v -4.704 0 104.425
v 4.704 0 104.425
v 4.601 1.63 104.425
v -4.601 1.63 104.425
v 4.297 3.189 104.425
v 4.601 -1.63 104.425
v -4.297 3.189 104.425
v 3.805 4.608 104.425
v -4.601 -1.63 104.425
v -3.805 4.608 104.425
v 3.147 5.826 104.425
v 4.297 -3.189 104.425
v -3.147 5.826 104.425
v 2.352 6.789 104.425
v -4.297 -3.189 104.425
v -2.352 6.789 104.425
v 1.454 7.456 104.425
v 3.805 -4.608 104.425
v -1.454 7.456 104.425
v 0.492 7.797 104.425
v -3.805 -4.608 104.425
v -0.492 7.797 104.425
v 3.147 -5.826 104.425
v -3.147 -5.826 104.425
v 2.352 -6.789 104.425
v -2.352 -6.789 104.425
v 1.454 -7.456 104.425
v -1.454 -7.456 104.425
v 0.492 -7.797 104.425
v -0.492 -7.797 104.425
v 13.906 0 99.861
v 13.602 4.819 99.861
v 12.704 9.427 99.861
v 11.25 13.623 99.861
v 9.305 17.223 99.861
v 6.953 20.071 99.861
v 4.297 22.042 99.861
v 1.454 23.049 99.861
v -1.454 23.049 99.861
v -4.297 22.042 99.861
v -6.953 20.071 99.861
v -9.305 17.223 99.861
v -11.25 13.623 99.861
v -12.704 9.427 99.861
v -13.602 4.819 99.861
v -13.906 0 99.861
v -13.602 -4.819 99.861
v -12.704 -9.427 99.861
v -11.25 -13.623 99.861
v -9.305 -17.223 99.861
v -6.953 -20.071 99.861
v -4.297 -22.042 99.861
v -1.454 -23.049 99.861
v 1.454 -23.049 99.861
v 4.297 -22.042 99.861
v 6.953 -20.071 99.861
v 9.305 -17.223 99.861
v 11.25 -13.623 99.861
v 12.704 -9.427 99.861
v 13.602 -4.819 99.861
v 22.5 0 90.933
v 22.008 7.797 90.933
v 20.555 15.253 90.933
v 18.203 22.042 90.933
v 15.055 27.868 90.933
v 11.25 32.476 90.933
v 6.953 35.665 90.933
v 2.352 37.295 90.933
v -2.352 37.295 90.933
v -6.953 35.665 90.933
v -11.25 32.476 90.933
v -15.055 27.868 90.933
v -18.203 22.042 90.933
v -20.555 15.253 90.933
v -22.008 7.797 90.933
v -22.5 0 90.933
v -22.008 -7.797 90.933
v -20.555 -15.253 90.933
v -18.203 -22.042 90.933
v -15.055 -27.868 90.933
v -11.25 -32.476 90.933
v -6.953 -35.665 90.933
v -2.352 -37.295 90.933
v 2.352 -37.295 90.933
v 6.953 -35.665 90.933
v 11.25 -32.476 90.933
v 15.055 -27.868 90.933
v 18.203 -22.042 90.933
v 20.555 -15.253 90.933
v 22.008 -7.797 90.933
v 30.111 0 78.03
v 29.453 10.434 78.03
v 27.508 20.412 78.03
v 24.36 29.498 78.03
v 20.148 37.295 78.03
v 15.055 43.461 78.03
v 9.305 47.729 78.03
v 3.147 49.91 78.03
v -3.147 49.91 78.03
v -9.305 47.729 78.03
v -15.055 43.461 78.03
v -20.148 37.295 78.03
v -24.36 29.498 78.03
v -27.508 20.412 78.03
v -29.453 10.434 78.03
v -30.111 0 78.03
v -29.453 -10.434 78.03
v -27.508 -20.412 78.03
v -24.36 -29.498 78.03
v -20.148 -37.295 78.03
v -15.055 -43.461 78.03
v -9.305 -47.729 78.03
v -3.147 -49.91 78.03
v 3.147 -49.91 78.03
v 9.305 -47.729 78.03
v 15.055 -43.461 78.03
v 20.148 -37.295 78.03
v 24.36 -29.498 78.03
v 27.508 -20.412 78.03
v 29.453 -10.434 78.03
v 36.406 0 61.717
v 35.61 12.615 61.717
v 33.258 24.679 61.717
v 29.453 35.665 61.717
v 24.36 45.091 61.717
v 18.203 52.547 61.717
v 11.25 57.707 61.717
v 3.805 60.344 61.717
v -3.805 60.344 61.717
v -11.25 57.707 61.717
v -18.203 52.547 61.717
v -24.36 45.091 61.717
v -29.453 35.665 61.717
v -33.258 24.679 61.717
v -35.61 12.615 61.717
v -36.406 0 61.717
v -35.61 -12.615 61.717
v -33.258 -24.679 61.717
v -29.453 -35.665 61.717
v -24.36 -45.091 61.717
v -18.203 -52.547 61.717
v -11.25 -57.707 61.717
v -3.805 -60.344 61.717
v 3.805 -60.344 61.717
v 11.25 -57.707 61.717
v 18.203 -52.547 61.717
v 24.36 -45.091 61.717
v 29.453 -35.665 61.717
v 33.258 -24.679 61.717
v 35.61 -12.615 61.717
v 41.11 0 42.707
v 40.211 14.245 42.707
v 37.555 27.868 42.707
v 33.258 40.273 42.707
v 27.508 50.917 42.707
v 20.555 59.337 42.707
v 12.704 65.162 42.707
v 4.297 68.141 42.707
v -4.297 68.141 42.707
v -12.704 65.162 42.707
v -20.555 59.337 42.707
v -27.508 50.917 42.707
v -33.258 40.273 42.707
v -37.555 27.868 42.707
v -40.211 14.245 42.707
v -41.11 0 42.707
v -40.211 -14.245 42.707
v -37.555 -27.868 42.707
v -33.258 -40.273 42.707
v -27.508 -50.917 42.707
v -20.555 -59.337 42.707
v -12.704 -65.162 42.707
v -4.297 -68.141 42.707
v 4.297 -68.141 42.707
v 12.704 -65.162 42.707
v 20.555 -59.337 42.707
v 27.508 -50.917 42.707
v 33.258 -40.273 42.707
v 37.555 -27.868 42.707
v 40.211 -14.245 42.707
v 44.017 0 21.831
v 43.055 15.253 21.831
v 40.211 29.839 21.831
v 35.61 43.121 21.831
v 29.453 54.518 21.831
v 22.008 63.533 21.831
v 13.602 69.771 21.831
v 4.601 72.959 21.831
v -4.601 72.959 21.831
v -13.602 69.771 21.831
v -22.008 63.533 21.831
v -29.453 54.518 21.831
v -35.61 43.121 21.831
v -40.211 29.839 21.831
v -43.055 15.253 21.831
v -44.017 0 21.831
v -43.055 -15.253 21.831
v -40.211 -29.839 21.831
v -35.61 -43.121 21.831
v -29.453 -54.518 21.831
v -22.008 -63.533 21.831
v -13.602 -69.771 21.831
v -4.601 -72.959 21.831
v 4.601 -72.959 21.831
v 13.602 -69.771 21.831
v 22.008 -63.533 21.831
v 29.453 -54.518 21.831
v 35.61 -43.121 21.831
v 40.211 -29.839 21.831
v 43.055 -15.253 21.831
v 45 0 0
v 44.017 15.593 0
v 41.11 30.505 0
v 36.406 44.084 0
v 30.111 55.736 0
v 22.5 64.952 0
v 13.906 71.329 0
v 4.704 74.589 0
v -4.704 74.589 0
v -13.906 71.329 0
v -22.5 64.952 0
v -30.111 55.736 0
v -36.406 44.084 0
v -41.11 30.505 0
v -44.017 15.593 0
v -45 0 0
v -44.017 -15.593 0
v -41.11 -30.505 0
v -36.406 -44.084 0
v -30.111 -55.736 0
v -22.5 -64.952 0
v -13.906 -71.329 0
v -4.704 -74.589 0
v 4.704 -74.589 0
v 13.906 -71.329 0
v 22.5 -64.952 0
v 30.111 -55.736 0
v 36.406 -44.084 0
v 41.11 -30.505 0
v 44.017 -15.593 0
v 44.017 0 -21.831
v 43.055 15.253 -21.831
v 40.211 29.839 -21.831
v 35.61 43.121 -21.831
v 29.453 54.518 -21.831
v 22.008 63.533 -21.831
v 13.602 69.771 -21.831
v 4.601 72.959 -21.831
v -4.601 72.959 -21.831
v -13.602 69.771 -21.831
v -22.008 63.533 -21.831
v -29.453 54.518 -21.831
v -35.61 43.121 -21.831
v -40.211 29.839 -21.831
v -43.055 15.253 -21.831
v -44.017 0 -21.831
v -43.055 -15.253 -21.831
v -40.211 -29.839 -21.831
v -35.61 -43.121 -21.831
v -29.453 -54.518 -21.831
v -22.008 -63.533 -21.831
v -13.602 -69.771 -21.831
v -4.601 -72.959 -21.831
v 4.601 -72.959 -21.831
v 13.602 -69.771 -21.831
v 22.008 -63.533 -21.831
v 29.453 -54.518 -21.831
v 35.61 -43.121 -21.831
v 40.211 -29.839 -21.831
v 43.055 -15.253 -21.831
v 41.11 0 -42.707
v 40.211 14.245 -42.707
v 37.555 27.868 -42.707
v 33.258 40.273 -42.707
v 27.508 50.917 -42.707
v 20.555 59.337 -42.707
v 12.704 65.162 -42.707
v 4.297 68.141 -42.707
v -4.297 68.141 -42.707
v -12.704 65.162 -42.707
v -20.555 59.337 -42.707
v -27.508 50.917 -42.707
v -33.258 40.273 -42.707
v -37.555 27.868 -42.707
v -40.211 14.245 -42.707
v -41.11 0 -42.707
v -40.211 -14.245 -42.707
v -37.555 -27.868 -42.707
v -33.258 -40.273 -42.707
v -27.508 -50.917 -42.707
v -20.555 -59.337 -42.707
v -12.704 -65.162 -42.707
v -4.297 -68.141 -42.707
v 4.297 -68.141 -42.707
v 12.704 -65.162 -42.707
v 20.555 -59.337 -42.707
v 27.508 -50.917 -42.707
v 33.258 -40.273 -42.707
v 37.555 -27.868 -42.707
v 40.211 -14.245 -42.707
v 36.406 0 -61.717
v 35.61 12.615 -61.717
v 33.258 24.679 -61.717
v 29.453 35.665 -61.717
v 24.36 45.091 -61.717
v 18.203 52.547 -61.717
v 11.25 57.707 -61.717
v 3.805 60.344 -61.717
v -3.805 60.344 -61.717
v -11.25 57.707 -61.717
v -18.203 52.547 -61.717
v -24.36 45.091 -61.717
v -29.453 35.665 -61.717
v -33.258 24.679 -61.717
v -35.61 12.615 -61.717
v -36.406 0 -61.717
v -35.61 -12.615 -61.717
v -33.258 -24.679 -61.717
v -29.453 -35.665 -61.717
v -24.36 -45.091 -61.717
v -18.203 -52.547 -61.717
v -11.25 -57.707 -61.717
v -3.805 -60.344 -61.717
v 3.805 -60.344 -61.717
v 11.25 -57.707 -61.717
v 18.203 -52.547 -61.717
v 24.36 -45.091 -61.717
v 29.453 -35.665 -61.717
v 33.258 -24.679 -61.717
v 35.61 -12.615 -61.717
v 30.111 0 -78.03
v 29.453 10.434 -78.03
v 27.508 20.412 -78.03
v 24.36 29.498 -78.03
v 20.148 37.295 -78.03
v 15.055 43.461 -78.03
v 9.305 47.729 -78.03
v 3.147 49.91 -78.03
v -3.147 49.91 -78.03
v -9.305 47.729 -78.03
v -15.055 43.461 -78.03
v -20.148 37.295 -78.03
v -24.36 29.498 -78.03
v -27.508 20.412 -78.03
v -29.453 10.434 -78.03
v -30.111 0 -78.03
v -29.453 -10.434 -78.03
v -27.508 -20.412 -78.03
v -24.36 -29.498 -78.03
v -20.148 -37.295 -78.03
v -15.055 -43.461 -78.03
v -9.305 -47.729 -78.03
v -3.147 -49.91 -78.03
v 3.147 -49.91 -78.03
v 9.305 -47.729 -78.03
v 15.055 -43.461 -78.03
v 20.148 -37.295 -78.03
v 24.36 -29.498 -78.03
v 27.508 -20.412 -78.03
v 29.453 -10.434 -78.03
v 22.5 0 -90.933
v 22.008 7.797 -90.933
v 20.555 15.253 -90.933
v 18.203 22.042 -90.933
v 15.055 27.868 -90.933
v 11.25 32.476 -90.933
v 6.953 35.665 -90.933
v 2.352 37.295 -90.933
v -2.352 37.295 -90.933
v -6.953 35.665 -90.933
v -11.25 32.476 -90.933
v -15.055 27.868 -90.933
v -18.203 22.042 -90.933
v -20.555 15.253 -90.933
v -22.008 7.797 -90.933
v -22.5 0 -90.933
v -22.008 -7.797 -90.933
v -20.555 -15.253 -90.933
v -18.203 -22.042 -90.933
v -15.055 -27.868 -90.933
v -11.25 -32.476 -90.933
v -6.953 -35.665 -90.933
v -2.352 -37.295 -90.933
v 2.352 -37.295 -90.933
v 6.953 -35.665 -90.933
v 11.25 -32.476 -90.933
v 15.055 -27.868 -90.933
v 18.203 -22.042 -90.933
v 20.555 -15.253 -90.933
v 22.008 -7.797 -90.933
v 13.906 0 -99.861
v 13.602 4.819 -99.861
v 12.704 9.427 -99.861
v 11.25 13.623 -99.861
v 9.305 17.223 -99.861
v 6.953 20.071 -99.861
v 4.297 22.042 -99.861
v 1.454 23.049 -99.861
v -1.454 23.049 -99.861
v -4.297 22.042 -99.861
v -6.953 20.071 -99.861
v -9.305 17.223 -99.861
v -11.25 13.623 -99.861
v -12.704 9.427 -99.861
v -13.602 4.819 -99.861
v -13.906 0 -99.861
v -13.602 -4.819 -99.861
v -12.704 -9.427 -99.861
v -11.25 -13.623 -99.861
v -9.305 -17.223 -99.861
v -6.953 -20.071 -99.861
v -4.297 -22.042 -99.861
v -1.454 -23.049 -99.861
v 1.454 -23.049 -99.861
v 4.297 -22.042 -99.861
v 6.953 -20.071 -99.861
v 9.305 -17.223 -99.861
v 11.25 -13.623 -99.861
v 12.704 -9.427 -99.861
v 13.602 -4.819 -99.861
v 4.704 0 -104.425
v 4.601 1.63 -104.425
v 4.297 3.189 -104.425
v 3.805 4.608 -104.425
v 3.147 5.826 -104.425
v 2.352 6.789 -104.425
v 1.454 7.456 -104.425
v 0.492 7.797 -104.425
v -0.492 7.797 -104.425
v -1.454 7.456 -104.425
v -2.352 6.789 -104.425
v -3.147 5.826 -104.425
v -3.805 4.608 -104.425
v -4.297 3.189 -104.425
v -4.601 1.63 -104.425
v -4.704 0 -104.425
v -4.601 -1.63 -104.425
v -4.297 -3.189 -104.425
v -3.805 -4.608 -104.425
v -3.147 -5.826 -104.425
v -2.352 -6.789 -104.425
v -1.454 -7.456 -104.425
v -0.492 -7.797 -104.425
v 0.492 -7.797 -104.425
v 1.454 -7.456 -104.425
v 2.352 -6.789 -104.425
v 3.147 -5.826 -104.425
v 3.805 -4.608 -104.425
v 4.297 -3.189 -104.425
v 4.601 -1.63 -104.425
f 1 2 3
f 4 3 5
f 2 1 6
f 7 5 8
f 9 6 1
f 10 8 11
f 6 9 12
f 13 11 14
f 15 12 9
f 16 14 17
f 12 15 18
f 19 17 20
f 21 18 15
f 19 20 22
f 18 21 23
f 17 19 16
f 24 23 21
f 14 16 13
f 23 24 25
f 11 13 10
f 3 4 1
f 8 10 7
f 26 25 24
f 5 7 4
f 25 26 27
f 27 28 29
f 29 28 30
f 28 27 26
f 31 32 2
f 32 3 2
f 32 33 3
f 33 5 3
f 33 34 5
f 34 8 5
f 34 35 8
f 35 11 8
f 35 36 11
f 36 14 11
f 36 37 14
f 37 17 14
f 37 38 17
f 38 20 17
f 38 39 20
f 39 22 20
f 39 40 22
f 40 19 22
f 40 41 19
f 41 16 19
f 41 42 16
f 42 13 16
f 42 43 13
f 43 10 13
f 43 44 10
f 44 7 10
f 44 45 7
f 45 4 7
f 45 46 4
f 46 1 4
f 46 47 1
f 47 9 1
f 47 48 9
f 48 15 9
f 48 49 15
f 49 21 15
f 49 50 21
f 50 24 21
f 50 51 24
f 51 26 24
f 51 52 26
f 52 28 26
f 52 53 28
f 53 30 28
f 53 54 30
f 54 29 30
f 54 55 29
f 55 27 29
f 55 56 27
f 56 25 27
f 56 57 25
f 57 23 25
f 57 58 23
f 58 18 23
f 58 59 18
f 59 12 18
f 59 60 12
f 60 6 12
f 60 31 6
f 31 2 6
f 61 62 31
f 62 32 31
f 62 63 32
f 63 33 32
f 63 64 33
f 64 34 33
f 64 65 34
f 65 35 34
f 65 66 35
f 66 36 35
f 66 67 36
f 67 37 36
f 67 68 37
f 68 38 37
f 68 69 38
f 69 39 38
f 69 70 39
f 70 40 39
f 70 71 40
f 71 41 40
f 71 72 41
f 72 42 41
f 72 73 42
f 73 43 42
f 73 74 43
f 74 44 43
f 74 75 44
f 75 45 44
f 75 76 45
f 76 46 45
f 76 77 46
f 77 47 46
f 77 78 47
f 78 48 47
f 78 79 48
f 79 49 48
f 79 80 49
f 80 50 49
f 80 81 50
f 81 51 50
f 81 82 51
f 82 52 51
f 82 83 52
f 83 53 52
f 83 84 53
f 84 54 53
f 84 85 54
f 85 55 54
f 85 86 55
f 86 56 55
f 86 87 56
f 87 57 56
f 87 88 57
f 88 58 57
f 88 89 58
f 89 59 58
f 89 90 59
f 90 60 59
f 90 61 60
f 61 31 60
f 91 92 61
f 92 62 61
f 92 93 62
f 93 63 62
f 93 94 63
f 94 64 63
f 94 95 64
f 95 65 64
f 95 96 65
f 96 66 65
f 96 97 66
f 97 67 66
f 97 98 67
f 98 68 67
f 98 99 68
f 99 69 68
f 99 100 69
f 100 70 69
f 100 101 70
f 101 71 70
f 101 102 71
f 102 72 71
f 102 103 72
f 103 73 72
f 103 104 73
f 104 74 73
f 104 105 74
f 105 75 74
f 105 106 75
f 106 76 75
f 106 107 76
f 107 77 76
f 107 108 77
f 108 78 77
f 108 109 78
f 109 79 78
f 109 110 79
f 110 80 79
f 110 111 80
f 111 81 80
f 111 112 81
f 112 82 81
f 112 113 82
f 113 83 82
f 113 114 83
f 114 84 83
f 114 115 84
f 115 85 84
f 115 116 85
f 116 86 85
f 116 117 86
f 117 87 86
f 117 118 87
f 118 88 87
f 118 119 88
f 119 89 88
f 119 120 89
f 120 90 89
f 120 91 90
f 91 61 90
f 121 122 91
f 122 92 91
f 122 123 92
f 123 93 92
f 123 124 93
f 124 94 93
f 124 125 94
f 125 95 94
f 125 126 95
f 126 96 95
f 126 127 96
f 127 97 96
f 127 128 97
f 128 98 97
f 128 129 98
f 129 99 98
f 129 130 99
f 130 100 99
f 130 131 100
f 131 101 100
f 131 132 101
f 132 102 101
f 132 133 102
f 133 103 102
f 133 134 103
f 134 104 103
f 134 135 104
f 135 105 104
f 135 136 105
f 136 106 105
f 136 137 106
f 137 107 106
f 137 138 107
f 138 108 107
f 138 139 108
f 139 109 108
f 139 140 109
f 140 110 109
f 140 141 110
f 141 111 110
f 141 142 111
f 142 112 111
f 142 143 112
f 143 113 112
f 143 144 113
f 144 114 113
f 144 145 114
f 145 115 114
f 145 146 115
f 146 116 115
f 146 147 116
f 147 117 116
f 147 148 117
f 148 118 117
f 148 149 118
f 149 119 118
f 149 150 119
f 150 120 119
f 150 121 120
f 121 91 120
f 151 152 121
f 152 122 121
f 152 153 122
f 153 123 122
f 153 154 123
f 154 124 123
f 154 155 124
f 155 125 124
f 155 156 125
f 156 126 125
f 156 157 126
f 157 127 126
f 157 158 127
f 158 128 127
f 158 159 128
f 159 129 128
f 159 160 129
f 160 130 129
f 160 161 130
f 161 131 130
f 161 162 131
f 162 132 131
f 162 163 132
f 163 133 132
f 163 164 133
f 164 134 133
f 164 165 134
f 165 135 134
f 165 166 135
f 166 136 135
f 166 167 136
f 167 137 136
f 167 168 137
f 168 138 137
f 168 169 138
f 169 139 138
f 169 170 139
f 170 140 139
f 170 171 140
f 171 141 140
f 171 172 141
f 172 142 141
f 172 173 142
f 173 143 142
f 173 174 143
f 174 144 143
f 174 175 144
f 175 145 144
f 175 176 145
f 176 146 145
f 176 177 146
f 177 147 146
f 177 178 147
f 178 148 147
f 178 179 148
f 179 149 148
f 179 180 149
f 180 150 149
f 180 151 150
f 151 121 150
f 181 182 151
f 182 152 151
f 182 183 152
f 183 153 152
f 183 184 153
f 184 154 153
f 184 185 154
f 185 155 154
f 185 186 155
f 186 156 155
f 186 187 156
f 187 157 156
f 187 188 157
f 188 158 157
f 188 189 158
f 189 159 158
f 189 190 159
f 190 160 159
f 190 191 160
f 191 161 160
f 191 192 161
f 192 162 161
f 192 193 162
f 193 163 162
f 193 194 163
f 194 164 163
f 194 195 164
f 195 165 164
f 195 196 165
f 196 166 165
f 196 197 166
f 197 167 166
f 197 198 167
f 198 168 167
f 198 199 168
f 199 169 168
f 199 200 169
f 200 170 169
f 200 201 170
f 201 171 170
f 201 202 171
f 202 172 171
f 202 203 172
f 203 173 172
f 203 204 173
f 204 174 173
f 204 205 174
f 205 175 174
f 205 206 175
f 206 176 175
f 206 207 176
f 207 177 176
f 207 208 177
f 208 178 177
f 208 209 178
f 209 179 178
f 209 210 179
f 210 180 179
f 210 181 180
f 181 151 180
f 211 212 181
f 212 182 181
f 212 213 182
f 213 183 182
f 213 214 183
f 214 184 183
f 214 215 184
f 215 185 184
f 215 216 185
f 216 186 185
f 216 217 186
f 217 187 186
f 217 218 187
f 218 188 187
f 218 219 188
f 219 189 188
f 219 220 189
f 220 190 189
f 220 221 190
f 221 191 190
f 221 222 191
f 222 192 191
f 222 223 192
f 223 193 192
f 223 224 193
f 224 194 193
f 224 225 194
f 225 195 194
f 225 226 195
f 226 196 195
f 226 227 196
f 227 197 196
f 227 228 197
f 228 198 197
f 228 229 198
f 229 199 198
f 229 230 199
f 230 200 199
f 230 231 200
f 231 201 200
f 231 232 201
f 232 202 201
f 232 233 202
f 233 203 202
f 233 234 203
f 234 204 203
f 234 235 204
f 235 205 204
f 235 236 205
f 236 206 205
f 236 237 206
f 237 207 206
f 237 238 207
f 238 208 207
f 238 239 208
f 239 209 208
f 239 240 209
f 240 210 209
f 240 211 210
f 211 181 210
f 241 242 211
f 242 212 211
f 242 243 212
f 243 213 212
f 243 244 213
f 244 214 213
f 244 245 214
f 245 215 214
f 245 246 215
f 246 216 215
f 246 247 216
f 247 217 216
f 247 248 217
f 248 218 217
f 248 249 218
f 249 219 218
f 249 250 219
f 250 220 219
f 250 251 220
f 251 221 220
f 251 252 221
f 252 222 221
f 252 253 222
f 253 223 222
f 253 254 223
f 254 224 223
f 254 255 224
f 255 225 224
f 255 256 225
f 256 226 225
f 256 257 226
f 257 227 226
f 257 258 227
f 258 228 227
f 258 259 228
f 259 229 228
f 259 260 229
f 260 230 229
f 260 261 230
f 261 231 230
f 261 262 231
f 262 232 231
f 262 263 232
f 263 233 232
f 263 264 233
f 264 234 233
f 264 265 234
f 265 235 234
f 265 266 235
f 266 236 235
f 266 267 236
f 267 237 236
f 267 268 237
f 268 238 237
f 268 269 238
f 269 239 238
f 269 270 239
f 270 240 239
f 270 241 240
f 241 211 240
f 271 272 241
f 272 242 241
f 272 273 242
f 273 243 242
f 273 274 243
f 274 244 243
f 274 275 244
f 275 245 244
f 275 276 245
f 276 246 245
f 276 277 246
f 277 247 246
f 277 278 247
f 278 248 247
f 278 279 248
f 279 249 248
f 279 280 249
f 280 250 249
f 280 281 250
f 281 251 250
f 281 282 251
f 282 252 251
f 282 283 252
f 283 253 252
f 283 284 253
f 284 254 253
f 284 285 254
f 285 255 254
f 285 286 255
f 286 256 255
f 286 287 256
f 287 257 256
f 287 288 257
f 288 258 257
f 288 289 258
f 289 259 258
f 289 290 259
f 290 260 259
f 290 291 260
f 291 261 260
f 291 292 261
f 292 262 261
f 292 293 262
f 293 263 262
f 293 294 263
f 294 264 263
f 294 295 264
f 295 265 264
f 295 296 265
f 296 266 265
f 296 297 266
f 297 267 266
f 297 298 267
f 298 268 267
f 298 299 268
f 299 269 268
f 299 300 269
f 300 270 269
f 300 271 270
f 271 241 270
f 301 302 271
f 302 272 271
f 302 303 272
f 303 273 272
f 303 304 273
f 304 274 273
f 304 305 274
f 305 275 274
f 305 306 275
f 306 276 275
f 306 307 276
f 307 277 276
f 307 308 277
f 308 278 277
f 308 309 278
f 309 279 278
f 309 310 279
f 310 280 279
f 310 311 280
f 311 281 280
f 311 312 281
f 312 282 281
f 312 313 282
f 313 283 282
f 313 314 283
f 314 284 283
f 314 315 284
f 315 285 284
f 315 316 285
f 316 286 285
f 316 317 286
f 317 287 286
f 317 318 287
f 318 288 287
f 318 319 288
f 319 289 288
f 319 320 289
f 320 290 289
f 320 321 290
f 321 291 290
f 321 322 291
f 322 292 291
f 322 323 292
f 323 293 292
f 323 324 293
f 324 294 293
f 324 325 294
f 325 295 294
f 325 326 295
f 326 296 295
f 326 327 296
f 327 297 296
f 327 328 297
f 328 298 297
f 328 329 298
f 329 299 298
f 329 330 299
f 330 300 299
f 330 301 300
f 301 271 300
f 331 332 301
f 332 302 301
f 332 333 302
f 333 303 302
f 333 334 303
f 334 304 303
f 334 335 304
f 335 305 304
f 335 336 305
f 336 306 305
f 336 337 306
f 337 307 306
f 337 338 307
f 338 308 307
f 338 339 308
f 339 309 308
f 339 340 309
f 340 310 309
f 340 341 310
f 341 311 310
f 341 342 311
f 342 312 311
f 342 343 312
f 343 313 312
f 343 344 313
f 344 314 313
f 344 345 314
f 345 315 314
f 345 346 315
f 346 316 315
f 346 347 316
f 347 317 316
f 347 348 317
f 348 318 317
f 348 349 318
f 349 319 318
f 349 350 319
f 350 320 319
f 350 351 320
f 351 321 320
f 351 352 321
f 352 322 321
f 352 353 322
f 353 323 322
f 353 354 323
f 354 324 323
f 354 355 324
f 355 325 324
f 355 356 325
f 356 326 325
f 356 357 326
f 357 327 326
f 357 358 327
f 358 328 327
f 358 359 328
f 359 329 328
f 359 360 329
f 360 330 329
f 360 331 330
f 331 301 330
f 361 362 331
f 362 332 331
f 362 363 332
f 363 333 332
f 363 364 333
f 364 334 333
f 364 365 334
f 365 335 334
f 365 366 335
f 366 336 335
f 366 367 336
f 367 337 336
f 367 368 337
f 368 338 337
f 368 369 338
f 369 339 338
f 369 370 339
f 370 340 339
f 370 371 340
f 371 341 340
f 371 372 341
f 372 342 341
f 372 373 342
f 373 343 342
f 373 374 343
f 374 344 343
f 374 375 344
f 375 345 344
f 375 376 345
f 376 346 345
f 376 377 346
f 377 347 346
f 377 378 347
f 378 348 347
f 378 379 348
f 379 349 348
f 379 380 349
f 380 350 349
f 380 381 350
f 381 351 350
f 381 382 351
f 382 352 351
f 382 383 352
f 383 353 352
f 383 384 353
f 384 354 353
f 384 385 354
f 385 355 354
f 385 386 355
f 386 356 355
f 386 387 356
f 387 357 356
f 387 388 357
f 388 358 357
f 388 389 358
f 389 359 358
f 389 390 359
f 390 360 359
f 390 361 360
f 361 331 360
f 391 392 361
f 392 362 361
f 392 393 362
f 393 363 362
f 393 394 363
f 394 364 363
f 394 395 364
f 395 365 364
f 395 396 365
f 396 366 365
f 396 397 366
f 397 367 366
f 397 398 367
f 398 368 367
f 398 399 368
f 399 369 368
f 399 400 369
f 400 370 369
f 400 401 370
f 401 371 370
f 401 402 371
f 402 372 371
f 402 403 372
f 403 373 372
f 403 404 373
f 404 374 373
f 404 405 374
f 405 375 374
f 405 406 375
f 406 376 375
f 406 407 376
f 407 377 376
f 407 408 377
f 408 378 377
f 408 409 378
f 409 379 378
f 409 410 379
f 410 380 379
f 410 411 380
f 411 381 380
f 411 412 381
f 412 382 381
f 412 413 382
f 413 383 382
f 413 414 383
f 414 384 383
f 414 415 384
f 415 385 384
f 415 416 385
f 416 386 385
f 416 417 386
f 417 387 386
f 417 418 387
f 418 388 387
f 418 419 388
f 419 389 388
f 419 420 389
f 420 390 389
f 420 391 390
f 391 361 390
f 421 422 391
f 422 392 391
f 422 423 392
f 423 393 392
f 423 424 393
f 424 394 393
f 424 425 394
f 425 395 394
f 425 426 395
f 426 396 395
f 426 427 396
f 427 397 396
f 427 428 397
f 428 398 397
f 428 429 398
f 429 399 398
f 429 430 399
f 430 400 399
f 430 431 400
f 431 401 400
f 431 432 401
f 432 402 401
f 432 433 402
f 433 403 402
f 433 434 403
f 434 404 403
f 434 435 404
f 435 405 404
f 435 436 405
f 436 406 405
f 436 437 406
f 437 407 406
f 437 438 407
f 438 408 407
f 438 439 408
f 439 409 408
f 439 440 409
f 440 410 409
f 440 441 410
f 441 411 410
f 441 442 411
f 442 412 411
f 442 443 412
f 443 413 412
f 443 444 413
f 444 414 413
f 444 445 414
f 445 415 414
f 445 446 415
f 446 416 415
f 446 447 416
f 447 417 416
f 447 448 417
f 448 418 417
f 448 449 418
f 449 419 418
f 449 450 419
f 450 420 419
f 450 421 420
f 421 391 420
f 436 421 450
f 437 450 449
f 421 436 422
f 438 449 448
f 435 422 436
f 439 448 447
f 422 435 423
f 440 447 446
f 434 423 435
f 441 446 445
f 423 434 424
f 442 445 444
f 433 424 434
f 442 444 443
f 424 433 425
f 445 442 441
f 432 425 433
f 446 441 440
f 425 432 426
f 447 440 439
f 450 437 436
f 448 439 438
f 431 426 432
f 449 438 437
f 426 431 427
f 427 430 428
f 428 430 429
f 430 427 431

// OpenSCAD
// Generated by SolidPython 1.0.1 on 2020-07-29 00:46:45


scale(v = [3, 5, 7]) {
	sphere(r = 15);
}
/***********************************************
*********      SolidPython code:      **********
************************************************
 
# import packages: SolidPython
from solid import *
from solid.utils import *
from itertools import chain, combinations, permutations


class Resize:

    def __init__(self, scad_file):
        self.scad_file = scad_file
        #self.scad_file = import_scad(scad_file)
        # cone/cylinder param:
        self.r1 = 0
        self.r2 = 0
        self.h = 0
        # rectangular prism param:
        self.w = 0
        self.l = 0
        # ellipse param:
        self.r = 0

    # import OpenScad code (file name corresponds to shape)


    # classify shape + parameters
    def assign(self, param1, param2, param3):
        if self.scad_file == 'cone.scad':
            self.r1 = param1
            self.r2 = param2
            self.h = param3
        elif self.scad_file == 'cylinder.scad':
            self.r1 = param1
            self.r2 = param2
            self.h = param3
        elif self.scad_file == 'rectangularPrism.scad':
            self.h = param1
            self.l = param2
            self.w = param3
        else:
            self.r = param1
            self.h = param2

    # resize parameters
    def iterate(self):
        x = range(3, 20, 2)
        i = 1
        if self.scad_file == 'cone.scad':
            tempList = list(permutations(x, 2))
            for temp in tempList:
                param1 = temp[0]
                param2 = temp[1]
                filepath = 'produced_scad_files/' + 'cone' + str(param1) + '_' + str(param2) + '_' + '.scad'
                scad_render_to_file(cylinder(h=param1, r1=param2, r2=0), filepath)

        elif self.scad_file == 'cylinder.scad':
            tempList = list(permutations(x, 3))
            for temp in tempList:
                param1 = temp[0]
                param2 = temp[1]
                filepath = 'produced_scad_files/' + 'cylinder' + str(param1) + '_' + str(param2) + '_' + '.scad'
                scad_render_to_file(cylinder(h=param1, r1=param2, r2=param2), filepath)

        elif self.scad_file == 'rectangularPrism.scad':
            tempList = list(permutations(x, 3))
            for temp in tempList:
                param1 = temp[0]
                param2 = temp[1]
                param3 = temp[2]
                filepath = 'produced_scad_files/' + 'rectangularPrism' + str(param1) + '_' + str(param2) + '_' + str(
                    param3) + '.scad'
                scad_render_to_file(cube(size=(param1, param2, param3)), filepath)

        elif self.scad_file == 'ellipse.scad':
            tempList = list(permutations(x, 4))
            for temp in tempList:
                param1 = temp[0]
                param2 = temp[1]
                param3 = temp[2]
                param4 = temp[3]
                filepath = 'produced_scad_files/' + 'ellipse' + str(param1) + '_' + str(param2) + '_' + str(param3) + '_' + str(param4) + '.scad'
                scad_render_to_file(scale([param1, param2, param3])(sphere(r=param4)), filepath)

    def render_to_scadfile(self):
        scad_render_to_file(scad, 'example.scad') 
 
************************************************/
